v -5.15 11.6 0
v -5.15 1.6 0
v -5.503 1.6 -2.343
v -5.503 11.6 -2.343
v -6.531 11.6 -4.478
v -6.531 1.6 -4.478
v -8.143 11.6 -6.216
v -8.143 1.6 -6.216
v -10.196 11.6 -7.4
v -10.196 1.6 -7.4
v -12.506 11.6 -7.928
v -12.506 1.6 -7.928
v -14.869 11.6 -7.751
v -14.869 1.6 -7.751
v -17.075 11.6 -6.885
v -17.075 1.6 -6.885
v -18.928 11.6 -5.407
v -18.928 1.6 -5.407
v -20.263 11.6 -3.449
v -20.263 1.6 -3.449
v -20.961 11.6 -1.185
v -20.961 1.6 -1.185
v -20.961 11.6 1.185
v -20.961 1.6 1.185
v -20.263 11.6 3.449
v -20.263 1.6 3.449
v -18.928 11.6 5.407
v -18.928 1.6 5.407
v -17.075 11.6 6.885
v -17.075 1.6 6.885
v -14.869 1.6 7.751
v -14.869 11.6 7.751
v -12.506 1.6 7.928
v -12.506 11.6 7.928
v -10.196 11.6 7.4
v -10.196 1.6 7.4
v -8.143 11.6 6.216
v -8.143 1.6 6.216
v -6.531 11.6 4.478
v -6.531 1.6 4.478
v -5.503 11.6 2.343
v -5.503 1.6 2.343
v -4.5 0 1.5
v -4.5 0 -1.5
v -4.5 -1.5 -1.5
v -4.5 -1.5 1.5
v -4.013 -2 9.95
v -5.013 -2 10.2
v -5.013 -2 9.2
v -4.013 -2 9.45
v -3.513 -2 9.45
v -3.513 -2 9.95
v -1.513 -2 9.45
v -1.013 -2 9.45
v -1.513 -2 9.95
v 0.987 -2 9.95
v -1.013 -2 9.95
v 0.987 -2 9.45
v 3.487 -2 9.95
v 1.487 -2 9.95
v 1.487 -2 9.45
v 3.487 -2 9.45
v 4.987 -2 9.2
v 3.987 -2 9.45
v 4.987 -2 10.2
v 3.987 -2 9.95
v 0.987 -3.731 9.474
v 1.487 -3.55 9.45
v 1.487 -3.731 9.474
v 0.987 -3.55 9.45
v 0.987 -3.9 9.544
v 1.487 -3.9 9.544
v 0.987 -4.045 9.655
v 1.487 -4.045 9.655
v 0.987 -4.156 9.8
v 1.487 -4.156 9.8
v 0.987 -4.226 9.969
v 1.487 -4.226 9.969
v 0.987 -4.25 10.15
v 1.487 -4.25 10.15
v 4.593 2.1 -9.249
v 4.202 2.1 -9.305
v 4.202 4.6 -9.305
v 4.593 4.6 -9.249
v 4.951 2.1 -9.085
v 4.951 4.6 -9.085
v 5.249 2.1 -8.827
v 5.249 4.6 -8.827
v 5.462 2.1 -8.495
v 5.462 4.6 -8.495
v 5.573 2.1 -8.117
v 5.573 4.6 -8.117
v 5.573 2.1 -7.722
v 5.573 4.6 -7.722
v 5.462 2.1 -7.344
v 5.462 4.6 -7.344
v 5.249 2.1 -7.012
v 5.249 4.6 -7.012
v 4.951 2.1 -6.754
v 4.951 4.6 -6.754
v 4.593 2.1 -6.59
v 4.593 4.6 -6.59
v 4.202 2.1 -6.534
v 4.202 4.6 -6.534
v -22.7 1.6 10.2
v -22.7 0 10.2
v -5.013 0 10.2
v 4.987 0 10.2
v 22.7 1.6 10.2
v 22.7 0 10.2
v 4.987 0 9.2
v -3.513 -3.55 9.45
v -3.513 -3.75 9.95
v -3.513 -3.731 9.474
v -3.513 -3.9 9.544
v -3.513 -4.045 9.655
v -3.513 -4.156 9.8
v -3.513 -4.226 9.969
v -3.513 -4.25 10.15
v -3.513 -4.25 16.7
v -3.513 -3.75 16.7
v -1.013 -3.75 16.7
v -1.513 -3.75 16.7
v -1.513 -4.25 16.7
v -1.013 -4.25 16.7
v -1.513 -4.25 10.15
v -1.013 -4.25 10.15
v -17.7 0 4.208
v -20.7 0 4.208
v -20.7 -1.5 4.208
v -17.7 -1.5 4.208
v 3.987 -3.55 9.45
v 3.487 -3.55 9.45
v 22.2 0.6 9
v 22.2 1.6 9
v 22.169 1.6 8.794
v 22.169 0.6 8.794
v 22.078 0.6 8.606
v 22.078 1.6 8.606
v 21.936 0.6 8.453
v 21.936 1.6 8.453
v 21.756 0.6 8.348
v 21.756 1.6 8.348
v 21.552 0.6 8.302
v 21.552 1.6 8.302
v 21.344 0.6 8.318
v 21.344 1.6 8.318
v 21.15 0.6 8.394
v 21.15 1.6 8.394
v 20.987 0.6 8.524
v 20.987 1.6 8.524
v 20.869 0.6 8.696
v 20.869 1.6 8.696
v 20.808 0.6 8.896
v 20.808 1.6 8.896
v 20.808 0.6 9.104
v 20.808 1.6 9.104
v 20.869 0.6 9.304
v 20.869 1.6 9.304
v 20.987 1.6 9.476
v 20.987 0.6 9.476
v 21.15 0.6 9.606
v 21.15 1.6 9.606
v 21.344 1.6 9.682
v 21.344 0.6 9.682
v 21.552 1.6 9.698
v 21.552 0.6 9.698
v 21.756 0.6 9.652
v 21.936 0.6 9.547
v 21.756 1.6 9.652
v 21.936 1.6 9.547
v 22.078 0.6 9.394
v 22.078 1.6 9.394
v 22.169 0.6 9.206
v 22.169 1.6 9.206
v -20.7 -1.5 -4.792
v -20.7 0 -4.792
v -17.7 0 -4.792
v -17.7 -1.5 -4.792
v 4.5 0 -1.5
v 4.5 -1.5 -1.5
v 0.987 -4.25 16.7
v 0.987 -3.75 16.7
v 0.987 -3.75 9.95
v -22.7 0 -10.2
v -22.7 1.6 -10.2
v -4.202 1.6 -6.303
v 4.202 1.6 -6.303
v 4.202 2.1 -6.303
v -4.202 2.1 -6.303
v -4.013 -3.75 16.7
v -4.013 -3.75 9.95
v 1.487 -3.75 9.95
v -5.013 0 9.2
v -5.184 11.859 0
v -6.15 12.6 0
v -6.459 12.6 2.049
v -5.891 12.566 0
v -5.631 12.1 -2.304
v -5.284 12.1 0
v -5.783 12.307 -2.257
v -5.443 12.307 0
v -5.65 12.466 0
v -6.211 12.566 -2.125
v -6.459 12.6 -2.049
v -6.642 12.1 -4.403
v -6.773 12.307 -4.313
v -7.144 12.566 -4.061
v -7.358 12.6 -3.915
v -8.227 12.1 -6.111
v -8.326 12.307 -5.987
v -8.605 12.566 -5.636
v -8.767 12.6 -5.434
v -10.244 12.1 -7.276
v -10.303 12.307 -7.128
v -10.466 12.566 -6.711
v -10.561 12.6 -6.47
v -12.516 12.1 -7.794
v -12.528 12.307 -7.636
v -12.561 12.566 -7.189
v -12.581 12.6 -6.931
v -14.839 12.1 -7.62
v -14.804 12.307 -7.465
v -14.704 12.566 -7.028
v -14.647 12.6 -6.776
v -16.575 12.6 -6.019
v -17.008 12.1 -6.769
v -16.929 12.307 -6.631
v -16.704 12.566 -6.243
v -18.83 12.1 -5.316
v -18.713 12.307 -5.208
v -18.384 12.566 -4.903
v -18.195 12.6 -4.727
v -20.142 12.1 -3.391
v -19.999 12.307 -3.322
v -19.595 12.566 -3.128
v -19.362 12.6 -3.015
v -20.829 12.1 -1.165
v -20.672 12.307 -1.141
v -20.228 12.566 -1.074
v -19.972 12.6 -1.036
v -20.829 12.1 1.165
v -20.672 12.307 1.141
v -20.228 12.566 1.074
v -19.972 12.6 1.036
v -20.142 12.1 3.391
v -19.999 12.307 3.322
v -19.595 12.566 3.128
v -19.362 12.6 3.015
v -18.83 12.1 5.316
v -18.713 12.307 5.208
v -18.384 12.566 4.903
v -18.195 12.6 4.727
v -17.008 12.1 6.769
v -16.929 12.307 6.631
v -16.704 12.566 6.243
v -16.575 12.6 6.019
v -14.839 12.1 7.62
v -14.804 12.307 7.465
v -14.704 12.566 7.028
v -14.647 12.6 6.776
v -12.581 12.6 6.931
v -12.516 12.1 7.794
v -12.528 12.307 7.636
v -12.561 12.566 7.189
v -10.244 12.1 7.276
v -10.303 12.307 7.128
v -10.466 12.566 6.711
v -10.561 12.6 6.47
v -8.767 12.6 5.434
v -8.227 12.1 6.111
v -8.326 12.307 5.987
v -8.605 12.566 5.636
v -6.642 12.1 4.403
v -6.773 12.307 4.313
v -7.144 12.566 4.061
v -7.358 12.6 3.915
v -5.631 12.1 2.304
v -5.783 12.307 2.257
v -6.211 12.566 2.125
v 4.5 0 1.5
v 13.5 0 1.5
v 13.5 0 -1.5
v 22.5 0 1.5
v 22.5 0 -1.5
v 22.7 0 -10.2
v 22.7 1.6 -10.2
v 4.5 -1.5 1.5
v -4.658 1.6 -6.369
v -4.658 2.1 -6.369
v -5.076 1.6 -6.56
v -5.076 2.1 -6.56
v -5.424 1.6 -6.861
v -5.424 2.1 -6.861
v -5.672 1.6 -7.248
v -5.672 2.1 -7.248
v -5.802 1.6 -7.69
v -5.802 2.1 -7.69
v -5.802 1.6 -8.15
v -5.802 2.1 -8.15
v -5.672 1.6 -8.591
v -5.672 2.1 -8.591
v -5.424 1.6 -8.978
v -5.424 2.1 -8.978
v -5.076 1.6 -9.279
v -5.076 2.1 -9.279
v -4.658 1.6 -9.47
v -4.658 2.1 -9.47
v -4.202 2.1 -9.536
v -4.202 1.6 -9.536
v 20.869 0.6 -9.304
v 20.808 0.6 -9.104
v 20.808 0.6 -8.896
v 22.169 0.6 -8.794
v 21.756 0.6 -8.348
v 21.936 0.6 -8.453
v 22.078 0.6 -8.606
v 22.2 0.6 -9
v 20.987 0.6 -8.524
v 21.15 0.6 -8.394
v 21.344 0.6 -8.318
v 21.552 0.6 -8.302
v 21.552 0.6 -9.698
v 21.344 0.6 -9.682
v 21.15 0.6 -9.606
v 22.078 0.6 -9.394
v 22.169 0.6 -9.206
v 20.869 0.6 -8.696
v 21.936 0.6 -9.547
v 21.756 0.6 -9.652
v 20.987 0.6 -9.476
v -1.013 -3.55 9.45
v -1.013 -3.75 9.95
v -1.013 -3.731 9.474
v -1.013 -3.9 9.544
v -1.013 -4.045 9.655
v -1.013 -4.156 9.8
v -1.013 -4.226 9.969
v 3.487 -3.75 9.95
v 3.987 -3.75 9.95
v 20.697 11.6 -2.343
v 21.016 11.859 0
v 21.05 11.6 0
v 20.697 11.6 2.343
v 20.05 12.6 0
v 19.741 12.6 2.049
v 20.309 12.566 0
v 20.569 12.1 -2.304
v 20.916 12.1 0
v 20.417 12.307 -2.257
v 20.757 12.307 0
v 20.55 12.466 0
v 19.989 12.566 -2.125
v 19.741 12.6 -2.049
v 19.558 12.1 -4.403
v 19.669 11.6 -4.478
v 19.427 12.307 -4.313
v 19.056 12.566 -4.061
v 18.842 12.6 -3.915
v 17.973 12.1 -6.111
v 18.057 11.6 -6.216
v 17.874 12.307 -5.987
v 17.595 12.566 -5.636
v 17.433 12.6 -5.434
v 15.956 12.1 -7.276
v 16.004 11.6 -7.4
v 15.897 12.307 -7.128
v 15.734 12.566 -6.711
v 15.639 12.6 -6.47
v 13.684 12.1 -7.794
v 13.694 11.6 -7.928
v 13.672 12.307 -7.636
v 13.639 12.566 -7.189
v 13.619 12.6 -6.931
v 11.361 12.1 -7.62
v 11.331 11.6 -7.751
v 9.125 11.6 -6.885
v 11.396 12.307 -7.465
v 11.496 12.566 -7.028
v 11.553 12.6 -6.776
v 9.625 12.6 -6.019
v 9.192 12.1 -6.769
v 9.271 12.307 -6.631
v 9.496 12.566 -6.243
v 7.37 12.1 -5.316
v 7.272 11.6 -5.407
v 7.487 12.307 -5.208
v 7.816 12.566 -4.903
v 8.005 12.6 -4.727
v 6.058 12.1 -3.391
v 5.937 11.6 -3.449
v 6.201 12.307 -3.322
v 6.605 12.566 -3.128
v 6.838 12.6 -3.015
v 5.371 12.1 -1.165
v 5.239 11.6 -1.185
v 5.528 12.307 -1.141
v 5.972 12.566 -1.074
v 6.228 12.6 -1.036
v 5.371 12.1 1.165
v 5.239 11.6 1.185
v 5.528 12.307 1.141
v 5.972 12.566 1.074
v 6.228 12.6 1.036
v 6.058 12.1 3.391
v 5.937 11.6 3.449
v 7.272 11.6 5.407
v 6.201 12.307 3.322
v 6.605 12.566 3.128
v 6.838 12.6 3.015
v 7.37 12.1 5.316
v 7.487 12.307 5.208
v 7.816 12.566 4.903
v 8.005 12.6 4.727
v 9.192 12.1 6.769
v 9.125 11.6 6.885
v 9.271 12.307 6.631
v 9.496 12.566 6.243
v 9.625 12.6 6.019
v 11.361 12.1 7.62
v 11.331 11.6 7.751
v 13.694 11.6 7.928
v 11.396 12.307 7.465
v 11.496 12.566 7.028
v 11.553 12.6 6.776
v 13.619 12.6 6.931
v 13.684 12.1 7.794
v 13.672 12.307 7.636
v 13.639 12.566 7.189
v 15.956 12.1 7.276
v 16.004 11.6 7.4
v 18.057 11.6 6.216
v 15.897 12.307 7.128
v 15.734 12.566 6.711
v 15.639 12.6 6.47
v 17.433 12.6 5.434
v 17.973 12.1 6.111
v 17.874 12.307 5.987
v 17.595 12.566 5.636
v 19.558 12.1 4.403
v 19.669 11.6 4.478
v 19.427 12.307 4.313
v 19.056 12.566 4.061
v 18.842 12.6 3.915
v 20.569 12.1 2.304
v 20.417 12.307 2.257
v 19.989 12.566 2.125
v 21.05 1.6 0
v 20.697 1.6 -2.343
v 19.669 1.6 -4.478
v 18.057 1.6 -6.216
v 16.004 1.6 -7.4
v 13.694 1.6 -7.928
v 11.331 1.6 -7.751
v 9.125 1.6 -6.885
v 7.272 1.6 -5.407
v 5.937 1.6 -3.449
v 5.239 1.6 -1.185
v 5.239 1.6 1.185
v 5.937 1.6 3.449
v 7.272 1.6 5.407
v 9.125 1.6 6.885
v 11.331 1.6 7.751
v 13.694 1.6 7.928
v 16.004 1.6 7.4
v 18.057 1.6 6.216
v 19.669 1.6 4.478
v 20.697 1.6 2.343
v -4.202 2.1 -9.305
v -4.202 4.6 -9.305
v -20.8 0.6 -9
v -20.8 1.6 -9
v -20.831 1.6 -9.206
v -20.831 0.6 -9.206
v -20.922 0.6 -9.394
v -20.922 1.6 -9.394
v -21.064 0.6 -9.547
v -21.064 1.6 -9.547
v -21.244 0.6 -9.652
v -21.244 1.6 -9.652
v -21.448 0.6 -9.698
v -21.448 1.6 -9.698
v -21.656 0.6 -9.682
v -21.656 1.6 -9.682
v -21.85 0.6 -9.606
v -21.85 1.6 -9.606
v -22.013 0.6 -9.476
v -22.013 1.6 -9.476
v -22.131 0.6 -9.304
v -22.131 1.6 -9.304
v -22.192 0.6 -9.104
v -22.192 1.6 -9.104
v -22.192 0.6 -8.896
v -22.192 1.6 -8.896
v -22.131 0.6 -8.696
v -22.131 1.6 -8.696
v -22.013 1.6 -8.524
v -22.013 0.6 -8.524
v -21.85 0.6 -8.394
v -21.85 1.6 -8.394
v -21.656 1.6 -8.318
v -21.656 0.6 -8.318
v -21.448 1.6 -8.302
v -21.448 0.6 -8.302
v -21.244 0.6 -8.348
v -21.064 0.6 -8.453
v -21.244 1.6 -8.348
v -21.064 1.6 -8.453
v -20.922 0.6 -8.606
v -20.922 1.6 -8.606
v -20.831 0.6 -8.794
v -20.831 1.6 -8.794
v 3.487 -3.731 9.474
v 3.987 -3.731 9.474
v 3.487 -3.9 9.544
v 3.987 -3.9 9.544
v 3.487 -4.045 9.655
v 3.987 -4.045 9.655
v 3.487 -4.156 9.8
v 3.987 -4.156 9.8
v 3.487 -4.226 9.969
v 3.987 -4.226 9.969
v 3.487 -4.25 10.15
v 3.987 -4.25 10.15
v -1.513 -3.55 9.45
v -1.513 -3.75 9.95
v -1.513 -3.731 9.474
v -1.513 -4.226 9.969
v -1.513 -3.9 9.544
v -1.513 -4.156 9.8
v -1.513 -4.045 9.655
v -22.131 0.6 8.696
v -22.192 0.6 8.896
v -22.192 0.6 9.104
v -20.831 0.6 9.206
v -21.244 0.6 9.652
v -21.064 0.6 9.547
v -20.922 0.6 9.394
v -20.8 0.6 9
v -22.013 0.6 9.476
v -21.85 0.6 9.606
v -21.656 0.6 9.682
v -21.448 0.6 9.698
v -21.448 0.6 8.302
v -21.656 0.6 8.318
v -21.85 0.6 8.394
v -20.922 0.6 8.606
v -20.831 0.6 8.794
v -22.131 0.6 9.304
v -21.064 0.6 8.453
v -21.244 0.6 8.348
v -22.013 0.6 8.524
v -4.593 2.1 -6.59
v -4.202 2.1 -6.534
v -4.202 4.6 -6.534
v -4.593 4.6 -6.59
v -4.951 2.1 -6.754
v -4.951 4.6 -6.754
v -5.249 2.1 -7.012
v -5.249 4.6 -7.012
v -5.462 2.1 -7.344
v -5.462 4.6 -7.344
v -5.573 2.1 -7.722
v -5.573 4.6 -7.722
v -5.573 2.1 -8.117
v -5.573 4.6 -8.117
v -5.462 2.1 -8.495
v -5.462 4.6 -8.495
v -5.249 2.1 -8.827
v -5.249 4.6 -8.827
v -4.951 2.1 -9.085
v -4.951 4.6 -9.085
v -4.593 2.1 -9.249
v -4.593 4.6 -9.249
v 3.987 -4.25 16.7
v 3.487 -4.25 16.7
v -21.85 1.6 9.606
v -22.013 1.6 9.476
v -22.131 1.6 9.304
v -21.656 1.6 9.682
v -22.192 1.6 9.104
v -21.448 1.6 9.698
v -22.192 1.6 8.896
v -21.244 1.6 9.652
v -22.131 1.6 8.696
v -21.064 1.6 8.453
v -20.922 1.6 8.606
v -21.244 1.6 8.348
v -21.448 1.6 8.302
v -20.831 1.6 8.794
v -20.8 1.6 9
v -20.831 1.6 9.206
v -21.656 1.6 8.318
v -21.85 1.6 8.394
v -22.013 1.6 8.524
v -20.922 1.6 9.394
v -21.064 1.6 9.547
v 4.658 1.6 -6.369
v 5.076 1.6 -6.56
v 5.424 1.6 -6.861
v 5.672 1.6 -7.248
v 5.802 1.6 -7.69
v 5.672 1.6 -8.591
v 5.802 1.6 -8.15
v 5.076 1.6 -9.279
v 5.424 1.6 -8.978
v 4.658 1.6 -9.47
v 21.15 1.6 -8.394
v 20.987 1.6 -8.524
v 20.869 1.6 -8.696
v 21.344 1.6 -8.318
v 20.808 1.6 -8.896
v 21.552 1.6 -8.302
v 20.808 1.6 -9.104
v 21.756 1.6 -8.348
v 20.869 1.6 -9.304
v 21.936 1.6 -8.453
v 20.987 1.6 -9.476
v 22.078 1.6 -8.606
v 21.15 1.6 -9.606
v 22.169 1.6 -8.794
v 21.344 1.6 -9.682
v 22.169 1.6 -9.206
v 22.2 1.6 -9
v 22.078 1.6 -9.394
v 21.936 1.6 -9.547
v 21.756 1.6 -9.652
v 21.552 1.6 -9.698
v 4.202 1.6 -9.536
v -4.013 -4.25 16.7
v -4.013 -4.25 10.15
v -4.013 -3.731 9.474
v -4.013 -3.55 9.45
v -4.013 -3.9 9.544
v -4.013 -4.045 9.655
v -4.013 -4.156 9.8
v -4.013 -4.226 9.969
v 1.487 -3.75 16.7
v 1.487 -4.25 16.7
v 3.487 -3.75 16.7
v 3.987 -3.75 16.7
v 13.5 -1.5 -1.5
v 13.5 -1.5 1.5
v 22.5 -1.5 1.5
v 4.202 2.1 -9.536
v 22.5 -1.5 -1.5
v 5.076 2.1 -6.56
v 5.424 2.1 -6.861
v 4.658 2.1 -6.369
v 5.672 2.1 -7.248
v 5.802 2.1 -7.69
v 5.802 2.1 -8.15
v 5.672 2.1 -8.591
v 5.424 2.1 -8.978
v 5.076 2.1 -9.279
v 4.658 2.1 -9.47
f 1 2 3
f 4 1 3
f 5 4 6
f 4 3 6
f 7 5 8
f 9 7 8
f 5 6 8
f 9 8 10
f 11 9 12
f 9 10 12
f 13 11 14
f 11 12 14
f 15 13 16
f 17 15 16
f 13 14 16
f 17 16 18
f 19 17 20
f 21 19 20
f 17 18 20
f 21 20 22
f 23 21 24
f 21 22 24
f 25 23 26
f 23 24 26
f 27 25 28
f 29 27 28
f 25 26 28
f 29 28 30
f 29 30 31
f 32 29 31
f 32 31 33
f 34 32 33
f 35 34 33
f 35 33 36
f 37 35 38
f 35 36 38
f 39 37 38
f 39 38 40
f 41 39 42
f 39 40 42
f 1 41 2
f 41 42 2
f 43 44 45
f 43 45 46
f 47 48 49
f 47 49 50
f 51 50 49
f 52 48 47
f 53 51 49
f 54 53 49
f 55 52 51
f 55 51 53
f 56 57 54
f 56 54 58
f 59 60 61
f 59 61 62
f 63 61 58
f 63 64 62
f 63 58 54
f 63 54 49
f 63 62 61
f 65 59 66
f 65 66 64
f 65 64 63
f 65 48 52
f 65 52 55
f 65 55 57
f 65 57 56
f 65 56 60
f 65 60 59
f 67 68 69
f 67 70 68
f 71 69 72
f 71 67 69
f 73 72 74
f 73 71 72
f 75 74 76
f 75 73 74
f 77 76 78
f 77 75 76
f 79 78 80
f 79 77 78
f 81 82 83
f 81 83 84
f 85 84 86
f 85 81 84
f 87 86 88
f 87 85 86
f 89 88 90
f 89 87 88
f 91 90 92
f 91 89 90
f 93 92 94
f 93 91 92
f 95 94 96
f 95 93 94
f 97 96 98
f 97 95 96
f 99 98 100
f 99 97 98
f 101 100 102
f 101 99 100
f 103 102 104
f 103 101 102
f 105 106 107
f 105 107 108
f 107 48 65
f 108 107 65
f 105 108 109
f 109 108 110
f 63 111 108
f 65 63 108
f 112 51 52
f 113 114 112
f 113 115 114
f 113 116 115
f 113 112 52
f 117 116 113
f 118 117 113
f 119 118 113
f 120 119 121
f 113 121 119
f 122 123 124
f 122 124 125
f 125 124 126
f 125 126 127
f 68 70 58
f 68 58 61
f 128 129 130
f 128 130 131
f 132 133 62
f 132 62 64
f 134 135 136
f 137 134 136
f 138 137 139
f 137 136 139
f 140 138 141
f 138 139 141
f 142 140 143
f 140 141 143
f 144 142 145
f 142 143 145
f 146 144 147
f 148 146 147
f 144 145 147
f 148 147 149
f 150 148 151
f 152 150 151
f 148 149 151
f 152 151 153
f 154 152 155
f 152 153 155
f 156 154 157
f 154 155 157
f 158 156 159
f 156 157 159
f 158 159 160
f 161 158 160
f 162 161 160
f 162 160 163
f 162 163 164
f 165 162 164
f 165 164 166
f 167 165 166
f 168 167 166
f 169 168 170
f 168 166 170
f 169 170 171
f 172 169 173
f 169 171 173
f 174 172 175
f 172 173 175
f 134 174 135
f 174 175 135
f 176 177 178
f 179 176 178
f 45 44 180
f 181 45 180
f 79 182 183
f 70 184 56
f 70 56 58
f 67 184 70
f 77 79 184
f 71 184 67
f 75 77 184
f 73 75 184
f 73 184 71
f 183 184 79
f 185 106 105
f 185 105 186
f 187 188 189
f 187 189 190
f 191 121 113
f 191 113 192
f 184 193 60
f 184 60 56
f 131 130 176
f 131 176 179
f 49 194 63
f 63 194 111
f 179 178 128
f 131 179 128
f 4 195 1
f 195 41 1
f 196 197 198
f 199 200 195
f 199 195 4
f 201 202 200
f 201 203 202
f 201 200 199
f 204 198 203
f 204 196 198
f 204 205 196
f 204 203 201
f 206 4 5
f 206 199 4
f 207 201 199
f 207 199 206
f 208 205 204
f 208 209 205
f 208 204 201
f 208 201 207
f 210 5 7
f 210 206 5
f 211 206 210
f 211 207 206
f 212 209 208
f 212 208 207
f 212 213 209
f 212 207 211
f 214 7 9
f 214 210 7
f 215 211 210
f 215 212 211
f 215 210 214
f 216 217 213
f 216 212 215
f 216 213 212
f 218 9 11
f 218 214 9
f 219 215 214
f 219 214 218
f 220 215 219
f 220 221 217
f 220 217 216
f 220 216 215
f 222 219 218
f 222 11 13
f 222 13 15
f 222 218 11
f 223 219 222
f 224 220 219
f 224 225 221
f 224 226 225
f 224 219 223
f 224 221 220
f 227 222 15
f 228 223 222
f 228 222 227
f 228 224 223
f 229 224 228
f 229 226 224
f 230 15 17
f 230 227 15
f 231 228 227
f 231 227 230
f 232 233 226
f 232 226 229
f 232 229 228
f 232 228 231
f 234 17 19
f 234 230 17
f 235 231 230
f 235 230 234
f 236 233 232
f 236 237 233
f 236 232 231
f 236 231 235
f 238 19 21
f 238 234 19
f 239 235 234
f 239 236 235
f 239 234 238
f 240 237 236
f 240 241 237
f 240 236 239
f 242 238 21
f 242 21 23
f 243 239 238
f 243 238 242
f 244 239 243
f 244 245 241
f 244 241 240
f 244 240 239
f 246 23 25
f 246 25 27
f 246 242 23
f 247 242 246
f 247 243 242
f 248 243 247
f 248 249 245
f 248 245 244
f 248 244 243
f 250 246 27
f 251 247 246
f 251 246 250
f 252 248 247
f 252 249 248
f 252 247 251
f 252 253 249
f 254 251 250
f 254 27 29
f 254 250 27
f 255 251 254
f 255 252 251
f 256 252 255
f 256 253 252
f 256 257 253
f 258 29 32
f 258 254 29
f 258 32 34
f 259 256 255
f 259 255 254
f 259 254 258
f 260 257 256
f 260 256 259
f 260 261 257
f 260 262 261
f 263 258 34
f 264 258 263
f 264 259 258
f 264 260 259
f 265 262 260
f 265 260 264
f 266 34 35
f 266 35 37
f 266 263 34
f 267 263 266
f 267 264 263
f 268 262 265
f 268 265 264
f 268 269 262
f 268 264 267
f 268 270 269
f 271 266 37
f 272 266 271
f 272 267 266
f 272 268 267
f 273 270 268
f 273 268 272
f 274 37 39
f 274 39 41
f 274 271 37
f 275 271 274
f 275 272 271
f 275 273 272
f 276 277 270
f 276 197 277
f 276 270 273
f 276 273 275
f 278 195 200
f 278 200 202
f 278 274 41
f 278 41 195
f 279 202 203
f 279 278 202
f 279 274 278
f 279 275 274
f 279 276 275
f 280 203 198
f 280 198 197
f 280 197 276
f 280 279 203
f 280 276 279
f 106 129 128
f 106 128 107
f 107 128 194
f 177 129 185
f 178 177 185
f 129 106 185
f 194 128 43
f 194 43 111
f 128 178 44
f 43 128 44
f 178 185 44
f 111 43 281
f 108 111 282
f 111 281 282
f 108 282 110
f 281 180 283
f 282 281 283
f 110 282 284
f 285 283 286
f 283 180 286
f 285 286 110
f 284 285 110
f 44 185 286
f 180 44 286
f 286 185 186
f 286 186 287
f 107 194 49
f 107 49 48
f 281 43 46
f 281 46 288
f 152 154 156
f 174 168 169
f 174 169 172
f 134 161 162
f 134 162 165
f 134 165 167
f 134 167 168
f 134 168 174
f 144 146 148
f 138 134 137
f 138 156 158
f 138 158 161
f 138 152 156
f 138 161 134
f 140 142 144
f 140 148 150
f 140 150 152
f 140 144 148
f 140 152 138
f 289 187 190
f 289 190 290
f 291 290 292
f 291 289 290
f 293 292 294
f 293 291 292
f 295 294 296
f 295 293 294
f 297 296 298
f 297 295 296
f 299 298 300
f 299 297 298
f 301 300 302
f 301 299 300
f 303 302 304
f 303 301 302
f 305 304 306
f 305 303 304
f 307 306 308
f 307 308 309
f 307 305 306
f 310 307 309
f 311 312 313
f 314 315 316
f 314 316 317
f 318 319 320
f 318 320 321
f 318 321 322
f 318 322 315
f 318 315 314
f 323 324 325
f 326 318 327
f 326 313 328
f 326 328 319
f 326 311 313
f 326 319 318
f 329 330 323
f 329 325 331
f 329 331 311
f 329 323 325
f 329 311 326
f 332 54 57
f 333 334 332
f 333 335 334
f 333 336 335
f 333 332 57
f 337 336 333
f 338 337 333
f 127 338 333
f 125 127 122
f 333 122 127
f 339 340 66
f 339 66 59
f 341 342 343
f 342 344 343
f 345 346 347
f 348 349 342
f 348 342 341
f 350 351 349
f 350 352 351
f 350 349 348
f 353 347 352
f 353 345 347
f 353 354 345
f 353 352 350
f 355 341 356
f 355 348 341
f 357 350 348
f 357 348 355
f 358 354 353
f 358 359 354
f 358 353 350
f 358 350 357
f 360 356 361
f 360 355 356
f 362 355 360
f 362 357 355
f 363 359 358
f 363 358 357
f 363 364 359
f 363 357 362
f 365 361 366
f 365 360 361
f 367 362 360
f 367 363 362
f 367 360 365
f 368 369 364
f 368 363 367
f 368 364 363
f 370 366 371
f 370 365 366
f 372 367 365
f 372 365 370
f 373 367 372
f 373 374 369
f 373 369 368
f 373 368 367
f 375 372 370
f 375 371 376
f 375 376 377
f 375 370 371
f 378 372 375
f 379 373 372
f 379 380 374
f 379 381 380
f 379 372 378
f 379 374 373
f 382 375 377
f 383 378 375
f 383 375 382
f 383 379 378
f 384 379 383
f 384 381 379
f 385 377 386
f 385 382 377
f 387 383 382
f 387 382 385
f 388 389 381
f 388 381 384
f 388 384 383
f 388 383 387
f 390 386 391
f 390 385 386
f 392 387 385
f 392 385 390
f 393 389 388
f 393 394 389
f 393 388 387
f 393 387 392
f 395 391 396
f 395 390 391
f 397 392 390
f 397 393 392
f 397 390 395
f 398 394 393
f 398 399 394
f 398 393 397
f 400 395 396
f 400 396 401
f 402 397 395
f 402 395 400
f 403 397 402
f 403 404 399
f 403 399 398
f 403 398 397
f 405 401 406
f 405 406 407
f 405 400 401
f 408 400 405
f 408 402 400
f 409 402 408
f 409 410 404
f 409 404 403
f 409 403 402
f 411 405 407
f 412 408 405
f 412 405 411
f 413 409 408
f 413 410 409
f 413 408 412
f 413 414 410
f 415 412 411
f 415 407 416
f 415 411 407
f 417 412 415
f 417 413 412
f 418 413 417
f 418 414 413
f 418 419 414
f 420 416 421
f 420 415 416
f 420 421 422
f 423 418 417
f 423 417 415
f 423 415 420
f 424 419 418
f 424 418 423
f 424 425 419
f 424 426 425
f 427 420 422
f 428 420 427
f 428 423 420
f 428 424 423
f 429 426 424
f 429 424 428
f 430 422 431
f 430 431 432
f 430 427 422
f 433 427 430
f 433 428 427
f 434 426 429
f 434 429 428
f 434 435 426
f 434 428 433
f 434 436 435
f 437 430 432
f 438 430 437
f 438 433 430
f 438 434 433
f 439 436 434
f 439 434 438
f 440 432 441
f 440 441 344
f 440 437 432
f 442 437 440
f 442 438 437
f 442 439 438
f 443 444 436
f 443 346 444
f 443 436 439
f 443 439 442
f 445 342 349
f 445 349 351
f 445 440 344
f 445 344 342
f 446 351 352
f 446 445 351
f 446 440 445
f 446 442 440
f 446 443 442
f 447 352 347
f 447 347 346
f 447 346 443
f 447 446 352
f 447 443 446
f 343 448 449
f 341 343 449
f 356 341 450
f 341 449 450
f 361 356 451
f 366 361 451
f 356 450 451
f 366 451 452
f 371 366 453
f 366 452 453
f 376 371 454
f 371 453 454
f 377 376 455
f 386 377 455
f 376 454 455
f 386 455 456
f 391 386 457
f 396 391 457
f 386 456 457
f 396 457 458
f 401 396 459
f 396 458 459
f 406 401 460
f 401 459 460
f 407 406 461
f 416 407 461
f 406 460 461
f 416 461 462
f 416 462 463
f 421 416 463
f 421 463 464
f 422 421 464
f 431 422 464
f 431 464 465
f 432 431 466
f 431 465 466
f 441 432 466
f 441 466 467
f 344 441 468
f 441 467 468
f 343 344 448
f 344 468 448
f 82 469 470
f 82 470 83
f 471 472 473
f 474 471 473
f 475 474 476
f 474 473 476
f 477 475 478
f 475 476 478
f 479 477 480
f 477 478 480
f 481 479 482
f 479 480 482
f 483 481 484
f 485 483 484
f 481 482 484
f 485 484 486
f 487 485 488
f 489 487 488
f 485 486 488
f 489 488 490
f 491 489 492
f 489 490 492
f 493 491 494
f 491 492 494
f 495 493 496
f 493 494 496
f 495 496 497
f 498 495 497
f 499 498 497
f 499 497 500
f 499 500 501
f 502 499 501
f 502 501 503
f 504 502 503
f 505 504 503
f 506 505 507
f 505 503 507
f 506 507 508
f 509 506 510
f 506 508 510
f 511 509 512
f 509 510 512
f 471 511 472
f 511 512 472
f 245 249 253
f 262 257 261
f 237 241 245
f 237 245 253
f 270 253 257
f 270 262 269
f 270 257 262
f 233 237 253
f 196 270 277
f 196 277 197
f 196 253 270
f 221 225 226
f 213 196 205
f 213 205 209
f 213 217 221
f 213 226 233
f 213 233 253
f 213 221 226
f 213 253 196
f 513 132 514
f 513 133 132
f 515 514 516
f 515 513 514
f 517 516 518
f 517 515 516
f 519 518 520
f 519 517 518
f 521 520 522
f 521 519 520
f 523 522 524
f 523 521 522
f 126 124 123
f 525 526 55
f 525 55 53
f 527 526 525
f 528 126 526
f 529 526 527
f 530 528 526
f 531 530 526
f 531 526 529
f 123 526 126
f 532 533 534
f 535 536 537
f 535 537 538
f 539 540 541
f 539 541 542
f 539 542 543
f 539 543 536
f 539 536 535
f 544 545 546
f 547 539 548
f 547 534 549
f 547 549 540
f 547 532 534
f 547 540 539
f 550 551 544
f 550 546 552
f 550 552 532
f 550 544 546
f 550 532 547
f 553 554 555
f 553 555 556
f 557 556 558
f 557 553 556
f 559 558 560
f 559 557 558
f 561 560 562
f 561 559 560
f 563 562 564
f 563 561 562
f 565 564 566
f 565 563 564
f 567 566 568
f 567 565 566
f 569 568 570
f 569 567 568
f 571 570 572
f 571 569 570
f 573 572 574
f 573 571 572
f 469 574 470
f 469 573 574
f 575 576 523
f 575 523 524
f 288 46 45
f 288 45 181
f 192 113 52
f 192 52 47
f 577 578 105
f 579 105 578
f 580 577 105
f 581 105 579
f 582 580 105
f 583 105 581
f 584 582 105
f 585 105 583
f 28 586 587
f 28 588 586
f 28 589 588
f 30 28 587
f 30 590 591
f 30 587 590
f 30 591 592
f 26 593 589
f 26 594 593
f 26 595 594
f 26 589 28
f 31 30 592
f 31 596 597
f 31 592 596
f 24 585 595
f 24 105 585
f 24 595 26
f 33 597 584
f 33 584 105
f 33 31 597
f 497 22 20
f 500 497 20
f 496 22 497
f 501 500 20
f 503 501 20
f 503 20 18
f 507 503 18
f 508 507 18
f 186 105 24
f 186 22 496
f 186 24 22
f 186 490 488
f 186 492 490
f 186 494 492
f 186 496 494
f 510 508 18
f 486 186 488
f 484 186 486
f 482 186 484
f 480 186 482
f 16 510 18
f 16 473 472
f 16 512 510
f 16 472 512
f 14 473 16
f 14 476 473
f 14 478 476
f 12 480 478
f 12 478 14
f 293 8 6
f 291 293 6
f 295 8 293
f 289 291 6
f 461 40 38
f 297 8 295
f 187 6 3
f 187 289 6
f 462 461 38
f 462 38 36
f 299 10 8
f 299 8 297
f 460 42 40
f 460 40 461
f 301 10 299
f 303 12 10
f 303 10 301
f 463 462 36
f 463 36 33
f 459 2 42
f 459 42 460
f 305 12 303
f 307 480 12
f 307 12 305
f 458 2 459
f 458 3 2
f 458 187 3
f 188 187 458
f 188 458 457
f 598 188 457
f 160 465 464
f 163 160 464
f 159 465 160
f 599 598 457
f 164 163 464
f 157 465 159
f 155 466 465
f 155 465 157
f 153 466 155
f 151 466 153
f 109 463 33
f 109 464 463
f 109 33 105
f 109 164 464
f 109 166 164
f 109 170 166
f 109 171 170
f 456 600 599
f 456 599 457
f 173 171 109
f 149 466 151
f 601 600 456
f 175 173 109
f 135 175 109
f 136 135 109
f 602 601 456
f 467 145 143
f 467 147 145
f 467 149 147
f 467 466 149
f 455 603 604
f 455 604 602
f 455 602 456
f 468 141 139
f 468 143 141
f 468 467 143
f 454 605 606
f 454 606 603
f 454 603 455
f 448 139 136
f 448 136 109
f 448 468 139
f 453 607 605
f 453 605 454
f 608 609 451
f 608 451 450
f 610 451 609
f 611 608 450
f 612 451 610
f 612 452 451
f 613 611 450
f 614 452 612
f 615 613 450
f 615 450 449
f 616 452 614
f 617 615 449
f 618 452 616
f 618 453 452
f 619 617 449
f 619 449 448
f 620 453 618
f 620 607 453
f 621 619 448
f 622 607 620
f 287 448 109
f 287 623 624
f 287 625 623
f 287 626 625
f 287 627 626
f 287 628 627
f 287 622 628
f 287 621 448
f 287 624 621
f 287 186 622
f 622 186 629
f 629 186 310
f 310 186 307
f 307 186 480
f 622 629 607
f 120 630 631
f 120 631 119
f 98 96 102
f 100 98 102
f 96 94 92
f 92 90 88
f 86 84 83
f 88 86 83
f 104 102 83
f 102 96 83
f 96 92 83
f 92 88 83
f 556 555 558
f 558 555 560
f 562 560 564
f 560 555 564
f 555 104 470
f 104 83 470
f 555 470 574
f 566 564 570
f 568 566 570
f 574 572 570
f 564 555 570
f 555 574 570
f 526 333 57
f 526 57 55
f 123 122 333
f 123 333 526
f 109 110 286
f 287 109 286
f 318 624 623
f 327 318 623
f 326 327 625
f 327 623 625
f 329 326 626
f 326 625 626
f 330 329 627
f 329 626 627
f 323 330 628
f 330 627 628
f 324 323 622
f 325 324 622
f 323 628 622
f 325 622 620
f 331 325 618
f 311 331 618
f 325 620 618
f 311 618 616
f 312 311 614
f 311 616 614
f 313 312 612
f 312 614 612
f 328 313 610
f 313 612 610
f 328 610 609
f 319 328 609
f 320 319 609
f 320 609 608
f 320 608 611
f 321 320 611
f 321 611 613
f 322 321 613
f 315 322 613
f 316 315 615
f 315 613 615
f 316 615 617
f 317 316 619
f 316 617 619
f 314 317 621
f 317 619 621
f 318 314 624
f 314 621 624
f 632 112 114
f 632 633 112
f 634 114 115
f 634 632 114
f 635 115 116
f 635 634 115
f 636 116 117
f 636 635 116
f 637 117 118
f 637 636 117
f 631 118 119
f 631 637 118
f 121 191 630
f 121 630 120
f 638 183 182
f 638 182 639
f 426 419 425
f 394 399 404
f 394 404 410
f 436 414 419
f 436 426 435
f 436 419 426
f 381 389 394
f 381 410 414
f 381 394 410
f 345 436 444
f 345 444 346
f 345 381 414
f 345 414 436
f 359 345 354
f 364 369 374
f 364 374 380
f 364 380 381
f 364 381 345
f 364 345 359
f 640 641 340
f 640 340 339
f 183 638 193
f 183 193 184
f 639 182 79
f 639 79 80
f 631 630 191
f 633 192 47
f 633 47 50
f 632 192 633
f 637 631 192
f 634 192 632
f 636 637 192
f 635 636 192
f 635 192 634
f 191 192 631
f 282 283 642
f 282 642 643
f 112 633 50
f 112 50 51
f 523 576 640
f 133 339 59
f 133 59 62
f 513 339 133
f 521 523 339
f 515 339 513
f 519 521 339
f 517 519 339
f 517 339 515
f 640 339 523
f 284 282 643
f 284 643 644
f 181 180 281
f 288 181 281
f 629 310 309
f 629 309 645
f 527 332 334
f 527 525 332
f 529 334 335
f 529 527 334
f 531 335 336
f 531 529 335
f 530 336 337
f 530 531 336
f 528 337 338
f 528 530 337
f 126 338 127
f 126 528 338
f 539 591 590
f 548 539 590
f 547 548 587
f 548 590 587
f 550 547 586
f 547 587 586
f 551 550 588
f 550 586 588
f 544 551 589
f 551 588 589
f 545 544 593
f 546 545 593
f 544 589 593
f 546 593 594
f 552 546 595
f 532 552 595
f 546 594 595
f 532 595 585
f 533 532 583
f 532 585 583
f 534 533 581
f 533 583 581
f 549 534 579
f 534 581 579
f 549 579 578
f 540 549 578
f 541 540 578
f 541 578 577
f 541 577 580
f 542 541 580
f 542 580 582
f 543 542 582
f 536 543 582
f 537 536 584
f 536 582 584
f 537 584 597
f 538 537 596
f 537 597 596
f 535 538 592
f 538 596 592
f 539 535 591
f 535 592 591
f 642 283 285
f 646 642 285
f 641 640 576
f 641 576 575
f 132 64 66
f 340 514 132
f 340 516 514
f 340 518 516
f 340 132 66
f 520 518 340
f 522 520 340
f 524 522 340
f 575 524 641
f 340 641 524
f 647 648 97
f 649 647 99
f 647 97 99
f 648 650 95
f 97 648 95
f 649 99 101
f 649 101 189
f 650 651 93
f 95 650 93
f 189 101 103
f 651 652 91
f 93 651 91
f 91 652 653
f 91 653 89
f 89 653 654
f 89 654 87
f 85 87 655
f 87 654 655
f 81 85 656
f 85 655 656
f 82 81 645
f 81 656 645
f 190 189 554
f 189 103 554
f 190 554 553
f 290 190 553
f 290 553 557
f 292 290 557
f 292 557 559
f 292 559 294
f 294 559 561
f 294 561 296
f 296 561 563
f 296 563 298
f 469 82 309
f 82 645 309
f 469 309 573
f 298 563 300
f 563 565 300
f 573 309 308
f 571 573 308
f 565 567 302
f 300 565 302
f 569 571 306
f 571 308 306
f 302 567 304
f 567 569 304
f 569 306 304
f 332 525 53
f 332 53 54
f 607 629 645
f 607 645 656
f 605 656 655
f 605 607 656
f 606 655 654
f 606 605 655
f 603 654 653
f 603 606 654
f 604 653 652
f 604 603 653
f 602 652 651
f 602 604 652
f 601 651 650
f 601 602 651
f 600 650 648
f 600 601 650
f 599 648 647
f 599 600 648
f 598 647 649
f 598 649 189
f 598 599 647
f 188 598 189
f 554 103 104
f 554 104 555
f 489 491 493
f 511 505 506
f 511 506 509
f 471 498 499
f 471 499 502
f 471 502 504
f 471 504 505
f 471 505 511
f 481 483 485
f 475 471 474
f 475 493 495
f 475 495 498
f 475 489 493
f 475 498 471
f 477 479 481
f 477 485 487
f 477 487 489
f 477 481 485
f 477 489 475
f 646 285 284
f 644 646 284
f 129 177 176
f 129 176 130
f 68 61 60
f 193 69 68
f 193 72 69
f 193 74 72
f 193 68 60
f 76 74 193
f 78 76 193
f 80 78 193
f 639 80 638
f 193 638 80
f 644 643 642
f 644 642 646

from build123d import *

# Parameters (mm, degrees)
CROQUIS1_W              = 45.4
CROQUIS1_H              = 20.4
SALIENTE_EXTRUIR1_DEPTH = 1.6
CROQUIS2_R              = 0.7
CORTAR_EXTRUIR1_DEPTH   = 1
SALIENTE_EXTRUIR2_DEPTH = 0.5
SALIENTE_EXTRUIR3_DEPTH = 3
CROQUIS9_R              = 7.95
SALIENTE_EXTRUIR4_DEPTH = 11
CROQUIS10_W             = 10
CROQUIS10_H             = 1
SALIENTE_EXTRUIR5_DEPTH = 2
CROQUIS12_W             = 0.5
CROQUIS12_H             = 0.5
REDONDEO4_R             = 0.7
MATRIZL1_COUNT          = 4
MATRIZL1_PITCH          = 2.5
REDONDEO5_R             = 1
CROQUIS13_W             = 9
CROQUIS13_H             = 3
SALIENTE_EXTRUIR6_DEPTH = 1.5
MATRIZL2_COUNT          = 2
MATRIZL2_PITCH          = 18
CROQUIS14_W             = 3
CROQUIS14_H             = 9
SALIENTE_EXTRUIR7_DEPTH = 1.5
REDONDEO6_R             = 0.7


with BuildPart() as part:
    # Croquis1 → Saliente-Extruir1 (new body)
    with BuildSketch(Plane(origin=(0, 0, 0), x_dir=(1, 0, 0), z_dir=(0, 1, 0))):
        Rectangle(CROQUIS1_W, CROQUIS1_H)
    extrude(amount=SALIENTE_EXTRUIR1_DEPTH)

    # Croquis2 → Cortar-Extruir1 (cut)
    with BuildSketch(Plane(origin=(0, 1.6, 0), x_dir=(1, 0, 0), z_dir=(0, 1, 0))):
        with Locations((-21.5, 9)):
            Circle(CROQUIS2_R)
        with Locations((21.5, 9)):
            Circle(CROQUIS2_R)
        with Locations((21.5, -9)):
            Circle(CROQUIS2_R)
        with Locations((-21.5, -9)):
            Circle(CROQUIS2_R)
    extrude(amount=-CORTAR_EXTRUIR1_DEPTH, mode=Mode.SUBTRACT)

    # Croquis3 → Saliente-Extruir2 (add)
    with BuildSketch(Plane(origin=(0, 1.6, 0), x_dir=(1, 0, 0), z_dir=(0, 1, 0))):
        with BuildLine():
            Line((-4.202221616, 9.535810589), (4.202221616, 9.535810589))
            ThreePointArc((4.202221616, 9.535810589), (5.818460699, 7.919571506), (4.202221616, 6.303332424))
            Line((4.202221616, 6.303332424), (-4.202221616, 6.303332424))
            ThreePointArc((-4.202221616, 6.303332424), (-5.818460699, 7.919571506), (-4.202221616, 9.535810589))
        make_face()
        with BuildLine():
            Line((-4.202221616, 9.304919292), (4.202221616, 9.304919292))
            ThreePointArc((4.202221616, 9.304919292), (5.587569401, 7.919571506), (4.202221616, 6.534223721))
            Line((4.202221616, 6.534223721), (-4.202221616, 6.534223721))
            ThreePointArc((-4.202221616, 6.534223721), (-5.587569401, 7.919571506), (-4.202221616, 9.304919292))
        make_face(mode=Mode.SUBTRACT)
    extrude(amount=SALIENTE_EXTRUIR2_DEPTH)

    # Croquis8 → Saliente-Extruir3 (add)
    with BuildSketch(Plane(origin=(0, 1.6, 0), x_dir=(1, 0, 0), z_dir=(0, 1, 0))):
        with BuildLine():
            Line((-4.202221616, 9.304919292), (4.202221616, 9.304919292))
            ThreePointArc((4.202221616, 9.304919292), (5.587569401, 7.919571506), (4.202221616, 6.534223721))
            Line((4.202221616, 6.534223721), (-4.202221616, 6.534223721))
            ThreePointArc((-4.202221616, 6.534223721), (-5.587569401, 7.919571506), (-4.202221616, 9.304919292))
        make_face()
    extrude(amount=SALIENTE_EXTRUIR3_DEPTH)

    # Croquis9 → Saliente-Extruir4 (add)
    with BuildSketch(Plane(origin=(0, 1.6, 0), x_dir=(1, 0, 0), z_dir=(0, 1, 0))):
        with Locations((-13.1, 0)):
            Circle(CROQUIS9_R)
        with Locations((13.1, 0)):
            Circle(CROQUIS9_R)
    extrude(amount=SALIENTE_EXTRUIR4_DEPTH)

    # Croquis10 → Saliente-Extruir5 (add)
    with BuildSketch(Plane.XZ):
        with Locations((-0.012747973, 9.7)):
            Rectangle(CROQUIS10_W, CROQUIS10_H)
    extrude(amount=SALIENTE_EXTRUIR5_DEPTH)

    # Barrer1: sweep along a curve in space
    with BuildLine() as barrer1_path:
        Line((-3.762747973, -2, 9.7), (-3.762747973, -4, 9.7))
        Line((-3.762747973, -4, 9.7), (-3.762747973, -4, 16.7))
    # Croquis12 → Barrer1 (sweep)
    with BuildSketch(Plane.XZ.offset(2)):
        with Locations((-3.762747973, 9.7)):
            Rectangle(CROQUIS12_W, CROQUIS12_H)
    barrer1 = sweep(path=barrer1_path.line, transition=Transition.RIGHT)

    # Redondeo4
    redondeo4_edges = [part.edges().sort_by_distance(p)[0] for p in [
        (-3.762747973, -4.25, 9.45),
    ]]
    fillet(redondeo4_edges, radius=REDONDEO4_R)

    # MatrizL1: Barrer1 ×4
    with Locations(*[(i * MATRIZL1_PITCH, 0, 0) for i in range(1, MATRIZL1_COUNT)]):
        add(barrer1)

    # Redondeo5
    redondeo5_edges = [part.edges().sort_by_distance(p)[0] for p in [
        (-21.05, 12.6, 0),
        (5.15, 12.6, 0),
    ]]
    fillet(redondeo5_edges, radius=REDONDEO5_R)

    # Croquis13 → Saliente-Extruir6 (add)
    with BuildSketch(Plane.XZ):
        Rectangle(CROQUIS13_W, CROQUIS13_H)
    saliente_extruir6 = extrude(amount=SALIENTE_EXTRUIR6_DEPTH)

    # MatrizL2: Saliente-Extruir6 ×2
    with Locations(*[(i * MATRIZL2_PITCH, 0, 0) for i in range(1, MATRIZL2_COUNT)]):
        add(saliente_extruir6)

    # Croquis14 → Saliente-Extruir7 (add)
    with BuildSketch(Plane.XZ):
        with Locations((-19.2, -0.292211089)):
            Rectangle(CROQUIS14_W, CROQUIS14_H)
    extrude(amount=SALIENTE_EXTRUIR7_DEPTH)

    # Redondeo6
    redondeo6_edges = [part.edges().sort_by_distance(p)[0] for p in [
        (-1.262747973, -4.25, 9.45),
        (1.237252027, -4.25, 9.45),
        (3.737252027, -4.25, 9.45),
    ]]
    fillet(redondeo6_edges, radius=REDONDEO6_R)


solid = part.part
